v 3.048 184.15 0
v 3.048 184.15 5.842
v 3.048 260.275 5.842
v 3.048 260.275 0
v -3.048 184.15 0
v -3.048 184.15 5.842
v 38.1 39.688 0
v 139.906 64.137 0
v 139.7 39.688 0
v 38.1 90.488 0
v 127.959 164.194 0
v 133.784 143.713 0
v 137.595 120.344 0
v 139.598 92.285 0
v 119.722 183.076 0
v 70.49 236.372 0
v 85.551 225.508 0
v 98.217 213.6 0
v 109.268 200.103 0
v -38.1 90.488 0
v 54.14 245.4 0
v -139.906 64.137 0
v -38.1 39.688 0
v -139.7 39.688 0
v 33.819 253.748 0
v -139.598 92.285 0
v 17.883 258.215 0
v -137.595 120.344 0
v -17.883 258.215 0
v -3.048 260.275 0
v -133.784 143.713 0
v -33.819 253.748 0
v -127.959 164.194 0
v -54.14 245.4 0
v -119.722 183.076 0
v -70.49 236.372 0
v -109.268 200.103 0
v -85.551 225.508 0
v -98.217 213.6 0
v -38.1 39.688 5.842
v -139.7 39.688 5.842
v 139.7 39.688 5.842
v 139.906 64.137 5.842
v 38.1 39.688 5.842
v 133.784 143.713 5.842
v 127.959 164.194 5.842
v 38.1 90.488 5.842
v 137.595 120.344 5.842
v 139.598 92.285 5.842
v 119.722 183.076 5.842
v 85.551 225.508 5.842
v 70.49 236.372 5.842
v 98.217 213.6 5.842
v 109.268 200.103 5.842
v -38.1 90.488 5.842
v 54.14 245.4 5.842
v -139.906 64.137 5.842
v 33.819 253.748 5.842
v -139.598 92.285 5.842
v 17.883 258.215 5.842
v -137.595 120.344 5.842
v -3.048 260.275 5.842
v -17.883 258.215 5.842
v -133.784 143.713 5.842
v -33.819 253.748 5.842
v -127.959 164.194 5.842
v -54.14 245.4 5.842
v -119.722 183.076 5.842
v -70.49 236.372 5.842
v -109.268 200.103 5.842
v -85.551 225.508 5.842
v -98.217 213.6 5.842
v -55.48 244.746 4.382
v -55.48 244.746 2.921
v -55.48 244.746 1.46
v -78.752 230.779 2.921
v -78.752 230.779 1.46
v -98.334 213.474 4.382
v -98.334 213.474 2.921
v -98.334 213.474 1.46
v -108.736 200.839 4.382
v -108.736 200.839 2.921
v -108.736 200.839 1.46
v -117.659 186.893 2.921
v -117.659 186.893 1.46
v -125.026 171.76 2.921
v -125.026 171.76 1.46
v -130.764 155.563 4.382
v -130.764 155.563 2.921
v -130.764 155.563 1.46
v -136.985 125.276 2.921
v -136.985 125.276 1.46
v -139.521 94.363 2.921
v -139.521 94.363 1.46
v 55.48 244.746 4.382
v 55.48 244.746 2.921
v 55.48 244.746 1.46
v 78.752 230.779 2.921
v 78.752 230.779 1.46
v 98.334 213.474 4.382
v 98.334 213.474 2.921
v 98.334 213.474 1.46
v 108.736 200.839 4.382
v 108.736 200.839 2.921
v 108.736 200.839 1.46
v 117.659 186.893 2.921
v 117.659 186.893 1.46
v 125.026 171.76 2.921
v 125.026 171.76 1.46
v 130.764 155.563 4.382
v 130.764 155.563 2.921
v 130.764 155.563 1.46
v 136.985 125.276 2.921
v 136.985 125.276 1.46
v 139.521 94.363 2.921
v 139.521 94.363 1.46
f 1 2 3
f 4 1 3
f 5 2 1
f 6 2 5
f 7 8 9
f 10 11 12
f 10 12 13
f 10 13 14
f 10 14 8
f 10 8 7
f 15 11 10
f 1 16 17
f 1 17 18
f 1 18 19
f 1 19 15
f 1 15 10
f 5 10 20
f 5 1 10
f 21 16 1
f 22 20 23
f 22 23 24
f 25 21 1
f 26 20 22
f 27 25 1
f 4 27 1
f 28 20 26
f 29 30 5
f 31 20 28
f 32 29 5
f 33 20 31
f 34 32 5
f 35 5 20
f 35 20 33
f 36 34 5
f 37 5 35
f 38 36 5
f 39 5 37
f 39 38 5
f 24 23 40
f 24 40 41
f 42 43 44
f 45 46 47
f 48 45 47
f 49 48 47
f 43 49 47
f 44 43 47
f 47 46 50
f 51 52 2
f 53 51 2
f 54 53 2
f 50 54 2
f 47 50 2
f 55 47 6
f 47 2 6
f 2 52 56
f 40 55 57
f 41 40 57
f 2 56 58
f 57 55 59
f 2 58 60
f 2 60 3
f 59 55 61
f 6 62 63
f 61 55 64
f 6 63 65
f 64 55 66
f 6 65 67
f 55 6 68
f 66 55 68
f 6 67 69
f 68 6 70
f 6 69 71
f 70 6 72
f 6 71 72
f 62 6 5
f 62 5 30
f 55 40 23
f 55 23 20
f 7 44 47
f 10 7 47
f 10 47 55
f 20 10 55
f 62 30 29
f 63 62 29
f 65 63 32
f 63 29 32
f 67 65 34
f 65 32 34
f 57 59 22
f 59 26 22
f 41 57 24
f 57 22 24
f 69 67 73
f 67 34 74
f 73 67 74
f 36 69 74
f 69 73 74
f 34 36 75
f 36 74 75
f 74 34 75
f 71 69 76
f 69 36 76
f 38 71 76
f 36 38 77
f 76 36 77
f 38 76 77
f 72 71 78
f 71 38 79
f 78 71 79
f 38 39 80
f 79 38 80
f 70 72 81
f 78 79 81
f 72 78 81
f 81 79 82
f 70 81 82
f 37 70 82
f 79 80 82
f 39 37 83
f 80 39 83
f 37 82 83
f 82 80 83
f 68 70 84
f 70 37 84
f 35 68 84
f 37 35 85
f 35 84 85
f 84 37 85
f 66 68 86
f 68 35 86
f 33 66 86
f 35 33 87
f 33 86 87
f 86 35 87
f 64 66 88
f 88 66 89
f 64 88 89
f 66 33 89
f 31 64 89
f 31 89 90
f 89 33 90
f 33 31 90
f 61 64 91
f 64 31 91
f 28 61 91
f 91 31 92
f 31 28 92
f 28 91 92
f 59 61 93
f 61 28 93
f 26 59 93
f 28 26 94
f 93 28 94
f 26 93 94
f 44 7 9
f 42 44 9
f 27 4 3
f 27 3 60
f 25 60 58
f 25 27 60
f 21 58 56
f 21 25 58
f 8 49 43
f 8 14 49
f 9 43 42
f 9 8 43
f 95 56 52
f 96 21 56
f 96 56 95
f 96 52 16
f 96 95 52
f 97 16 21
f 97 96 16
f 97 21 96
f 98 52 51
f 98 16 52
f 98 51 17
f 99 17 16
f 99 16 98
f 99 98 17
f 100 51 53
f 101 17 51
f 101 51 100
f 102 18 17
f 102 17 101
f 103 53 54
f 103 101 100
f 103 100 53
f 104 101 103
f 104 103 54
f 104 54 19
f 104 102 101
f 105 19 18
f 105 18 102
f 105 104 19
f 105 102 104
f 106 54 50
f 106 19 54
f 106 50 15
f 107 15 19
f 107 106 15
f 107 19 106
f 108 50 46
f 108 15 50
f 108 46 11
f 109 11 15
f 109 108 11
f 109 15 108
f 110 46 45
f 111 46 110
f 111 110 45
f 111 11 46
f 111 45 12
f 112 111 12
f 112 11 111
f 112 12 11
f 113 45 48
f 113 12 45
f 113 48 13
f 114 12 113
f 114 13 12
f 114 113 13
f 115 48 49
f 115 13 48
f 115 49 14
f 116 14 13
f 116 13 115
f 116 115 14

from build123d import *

# Parameters (mm, degrees)
BOSS_EXTRUDE1_DEPTH = 5.842
SKETCH3_W           = 38.1
SKETCH3_H           = 50.8
SKETCH3_W_2         = 3.048
SKETCH3_H_2         = 76.2
CUT_EXTRUDE1_DEPTH  = 296.629932067


with BuildPart() as part:
    # Sketch2 → Boss-Extrude1 (new body)
    with BuildSketch(Plane.XY):
        with BuildLine():
            Line((0, 260.35), (0, 39.6875))
            Line((0, 39.6875), (139.7, 39.6875))
            add(Edge.make_bspline(
                [(0, 260.35), (16.070876529, 260.35), (56.775834588, 247.639527653), (104.303414455, 213.336844908), (143.628247025, 143.243818772), (139.7, 69.950012947), (139.7, 39.6875)],
                knots=[0, 0, 0, 0, 0.196513492, 0.377404691, 0.603721219, 1, 1, 1, 1], degree=3))
        make_face()
    extrude(amount=BOSS_EXTRUDE1_DEPTH)

    # Sketch3 → Cut-Extrude1 (cut, through all)
    with BuildSketch(Plane.XY.offset(5.842)):
        with Locations((19.05, 65.0875)):
            Rectangle(SKETCH3_W, SKETCH3_H)
        with Locations((1.524, 222.25)):
            Rectangle(SKETCH3_W_2, SKETCH3_H_2)
    extrude(amount=-CUT_EXTRUDE1_DEPTH, mode=Mode.SUBTRACT)

    # Mirror1: part across plane


with BuildPart() as part_1:
    add(part.part)
    add(part.part.mirror(Plane(origin=(0, 0, 0), x_dir=(0, 0, 1), z_dir=(1, 0, 0))))


solid = part_1.part
